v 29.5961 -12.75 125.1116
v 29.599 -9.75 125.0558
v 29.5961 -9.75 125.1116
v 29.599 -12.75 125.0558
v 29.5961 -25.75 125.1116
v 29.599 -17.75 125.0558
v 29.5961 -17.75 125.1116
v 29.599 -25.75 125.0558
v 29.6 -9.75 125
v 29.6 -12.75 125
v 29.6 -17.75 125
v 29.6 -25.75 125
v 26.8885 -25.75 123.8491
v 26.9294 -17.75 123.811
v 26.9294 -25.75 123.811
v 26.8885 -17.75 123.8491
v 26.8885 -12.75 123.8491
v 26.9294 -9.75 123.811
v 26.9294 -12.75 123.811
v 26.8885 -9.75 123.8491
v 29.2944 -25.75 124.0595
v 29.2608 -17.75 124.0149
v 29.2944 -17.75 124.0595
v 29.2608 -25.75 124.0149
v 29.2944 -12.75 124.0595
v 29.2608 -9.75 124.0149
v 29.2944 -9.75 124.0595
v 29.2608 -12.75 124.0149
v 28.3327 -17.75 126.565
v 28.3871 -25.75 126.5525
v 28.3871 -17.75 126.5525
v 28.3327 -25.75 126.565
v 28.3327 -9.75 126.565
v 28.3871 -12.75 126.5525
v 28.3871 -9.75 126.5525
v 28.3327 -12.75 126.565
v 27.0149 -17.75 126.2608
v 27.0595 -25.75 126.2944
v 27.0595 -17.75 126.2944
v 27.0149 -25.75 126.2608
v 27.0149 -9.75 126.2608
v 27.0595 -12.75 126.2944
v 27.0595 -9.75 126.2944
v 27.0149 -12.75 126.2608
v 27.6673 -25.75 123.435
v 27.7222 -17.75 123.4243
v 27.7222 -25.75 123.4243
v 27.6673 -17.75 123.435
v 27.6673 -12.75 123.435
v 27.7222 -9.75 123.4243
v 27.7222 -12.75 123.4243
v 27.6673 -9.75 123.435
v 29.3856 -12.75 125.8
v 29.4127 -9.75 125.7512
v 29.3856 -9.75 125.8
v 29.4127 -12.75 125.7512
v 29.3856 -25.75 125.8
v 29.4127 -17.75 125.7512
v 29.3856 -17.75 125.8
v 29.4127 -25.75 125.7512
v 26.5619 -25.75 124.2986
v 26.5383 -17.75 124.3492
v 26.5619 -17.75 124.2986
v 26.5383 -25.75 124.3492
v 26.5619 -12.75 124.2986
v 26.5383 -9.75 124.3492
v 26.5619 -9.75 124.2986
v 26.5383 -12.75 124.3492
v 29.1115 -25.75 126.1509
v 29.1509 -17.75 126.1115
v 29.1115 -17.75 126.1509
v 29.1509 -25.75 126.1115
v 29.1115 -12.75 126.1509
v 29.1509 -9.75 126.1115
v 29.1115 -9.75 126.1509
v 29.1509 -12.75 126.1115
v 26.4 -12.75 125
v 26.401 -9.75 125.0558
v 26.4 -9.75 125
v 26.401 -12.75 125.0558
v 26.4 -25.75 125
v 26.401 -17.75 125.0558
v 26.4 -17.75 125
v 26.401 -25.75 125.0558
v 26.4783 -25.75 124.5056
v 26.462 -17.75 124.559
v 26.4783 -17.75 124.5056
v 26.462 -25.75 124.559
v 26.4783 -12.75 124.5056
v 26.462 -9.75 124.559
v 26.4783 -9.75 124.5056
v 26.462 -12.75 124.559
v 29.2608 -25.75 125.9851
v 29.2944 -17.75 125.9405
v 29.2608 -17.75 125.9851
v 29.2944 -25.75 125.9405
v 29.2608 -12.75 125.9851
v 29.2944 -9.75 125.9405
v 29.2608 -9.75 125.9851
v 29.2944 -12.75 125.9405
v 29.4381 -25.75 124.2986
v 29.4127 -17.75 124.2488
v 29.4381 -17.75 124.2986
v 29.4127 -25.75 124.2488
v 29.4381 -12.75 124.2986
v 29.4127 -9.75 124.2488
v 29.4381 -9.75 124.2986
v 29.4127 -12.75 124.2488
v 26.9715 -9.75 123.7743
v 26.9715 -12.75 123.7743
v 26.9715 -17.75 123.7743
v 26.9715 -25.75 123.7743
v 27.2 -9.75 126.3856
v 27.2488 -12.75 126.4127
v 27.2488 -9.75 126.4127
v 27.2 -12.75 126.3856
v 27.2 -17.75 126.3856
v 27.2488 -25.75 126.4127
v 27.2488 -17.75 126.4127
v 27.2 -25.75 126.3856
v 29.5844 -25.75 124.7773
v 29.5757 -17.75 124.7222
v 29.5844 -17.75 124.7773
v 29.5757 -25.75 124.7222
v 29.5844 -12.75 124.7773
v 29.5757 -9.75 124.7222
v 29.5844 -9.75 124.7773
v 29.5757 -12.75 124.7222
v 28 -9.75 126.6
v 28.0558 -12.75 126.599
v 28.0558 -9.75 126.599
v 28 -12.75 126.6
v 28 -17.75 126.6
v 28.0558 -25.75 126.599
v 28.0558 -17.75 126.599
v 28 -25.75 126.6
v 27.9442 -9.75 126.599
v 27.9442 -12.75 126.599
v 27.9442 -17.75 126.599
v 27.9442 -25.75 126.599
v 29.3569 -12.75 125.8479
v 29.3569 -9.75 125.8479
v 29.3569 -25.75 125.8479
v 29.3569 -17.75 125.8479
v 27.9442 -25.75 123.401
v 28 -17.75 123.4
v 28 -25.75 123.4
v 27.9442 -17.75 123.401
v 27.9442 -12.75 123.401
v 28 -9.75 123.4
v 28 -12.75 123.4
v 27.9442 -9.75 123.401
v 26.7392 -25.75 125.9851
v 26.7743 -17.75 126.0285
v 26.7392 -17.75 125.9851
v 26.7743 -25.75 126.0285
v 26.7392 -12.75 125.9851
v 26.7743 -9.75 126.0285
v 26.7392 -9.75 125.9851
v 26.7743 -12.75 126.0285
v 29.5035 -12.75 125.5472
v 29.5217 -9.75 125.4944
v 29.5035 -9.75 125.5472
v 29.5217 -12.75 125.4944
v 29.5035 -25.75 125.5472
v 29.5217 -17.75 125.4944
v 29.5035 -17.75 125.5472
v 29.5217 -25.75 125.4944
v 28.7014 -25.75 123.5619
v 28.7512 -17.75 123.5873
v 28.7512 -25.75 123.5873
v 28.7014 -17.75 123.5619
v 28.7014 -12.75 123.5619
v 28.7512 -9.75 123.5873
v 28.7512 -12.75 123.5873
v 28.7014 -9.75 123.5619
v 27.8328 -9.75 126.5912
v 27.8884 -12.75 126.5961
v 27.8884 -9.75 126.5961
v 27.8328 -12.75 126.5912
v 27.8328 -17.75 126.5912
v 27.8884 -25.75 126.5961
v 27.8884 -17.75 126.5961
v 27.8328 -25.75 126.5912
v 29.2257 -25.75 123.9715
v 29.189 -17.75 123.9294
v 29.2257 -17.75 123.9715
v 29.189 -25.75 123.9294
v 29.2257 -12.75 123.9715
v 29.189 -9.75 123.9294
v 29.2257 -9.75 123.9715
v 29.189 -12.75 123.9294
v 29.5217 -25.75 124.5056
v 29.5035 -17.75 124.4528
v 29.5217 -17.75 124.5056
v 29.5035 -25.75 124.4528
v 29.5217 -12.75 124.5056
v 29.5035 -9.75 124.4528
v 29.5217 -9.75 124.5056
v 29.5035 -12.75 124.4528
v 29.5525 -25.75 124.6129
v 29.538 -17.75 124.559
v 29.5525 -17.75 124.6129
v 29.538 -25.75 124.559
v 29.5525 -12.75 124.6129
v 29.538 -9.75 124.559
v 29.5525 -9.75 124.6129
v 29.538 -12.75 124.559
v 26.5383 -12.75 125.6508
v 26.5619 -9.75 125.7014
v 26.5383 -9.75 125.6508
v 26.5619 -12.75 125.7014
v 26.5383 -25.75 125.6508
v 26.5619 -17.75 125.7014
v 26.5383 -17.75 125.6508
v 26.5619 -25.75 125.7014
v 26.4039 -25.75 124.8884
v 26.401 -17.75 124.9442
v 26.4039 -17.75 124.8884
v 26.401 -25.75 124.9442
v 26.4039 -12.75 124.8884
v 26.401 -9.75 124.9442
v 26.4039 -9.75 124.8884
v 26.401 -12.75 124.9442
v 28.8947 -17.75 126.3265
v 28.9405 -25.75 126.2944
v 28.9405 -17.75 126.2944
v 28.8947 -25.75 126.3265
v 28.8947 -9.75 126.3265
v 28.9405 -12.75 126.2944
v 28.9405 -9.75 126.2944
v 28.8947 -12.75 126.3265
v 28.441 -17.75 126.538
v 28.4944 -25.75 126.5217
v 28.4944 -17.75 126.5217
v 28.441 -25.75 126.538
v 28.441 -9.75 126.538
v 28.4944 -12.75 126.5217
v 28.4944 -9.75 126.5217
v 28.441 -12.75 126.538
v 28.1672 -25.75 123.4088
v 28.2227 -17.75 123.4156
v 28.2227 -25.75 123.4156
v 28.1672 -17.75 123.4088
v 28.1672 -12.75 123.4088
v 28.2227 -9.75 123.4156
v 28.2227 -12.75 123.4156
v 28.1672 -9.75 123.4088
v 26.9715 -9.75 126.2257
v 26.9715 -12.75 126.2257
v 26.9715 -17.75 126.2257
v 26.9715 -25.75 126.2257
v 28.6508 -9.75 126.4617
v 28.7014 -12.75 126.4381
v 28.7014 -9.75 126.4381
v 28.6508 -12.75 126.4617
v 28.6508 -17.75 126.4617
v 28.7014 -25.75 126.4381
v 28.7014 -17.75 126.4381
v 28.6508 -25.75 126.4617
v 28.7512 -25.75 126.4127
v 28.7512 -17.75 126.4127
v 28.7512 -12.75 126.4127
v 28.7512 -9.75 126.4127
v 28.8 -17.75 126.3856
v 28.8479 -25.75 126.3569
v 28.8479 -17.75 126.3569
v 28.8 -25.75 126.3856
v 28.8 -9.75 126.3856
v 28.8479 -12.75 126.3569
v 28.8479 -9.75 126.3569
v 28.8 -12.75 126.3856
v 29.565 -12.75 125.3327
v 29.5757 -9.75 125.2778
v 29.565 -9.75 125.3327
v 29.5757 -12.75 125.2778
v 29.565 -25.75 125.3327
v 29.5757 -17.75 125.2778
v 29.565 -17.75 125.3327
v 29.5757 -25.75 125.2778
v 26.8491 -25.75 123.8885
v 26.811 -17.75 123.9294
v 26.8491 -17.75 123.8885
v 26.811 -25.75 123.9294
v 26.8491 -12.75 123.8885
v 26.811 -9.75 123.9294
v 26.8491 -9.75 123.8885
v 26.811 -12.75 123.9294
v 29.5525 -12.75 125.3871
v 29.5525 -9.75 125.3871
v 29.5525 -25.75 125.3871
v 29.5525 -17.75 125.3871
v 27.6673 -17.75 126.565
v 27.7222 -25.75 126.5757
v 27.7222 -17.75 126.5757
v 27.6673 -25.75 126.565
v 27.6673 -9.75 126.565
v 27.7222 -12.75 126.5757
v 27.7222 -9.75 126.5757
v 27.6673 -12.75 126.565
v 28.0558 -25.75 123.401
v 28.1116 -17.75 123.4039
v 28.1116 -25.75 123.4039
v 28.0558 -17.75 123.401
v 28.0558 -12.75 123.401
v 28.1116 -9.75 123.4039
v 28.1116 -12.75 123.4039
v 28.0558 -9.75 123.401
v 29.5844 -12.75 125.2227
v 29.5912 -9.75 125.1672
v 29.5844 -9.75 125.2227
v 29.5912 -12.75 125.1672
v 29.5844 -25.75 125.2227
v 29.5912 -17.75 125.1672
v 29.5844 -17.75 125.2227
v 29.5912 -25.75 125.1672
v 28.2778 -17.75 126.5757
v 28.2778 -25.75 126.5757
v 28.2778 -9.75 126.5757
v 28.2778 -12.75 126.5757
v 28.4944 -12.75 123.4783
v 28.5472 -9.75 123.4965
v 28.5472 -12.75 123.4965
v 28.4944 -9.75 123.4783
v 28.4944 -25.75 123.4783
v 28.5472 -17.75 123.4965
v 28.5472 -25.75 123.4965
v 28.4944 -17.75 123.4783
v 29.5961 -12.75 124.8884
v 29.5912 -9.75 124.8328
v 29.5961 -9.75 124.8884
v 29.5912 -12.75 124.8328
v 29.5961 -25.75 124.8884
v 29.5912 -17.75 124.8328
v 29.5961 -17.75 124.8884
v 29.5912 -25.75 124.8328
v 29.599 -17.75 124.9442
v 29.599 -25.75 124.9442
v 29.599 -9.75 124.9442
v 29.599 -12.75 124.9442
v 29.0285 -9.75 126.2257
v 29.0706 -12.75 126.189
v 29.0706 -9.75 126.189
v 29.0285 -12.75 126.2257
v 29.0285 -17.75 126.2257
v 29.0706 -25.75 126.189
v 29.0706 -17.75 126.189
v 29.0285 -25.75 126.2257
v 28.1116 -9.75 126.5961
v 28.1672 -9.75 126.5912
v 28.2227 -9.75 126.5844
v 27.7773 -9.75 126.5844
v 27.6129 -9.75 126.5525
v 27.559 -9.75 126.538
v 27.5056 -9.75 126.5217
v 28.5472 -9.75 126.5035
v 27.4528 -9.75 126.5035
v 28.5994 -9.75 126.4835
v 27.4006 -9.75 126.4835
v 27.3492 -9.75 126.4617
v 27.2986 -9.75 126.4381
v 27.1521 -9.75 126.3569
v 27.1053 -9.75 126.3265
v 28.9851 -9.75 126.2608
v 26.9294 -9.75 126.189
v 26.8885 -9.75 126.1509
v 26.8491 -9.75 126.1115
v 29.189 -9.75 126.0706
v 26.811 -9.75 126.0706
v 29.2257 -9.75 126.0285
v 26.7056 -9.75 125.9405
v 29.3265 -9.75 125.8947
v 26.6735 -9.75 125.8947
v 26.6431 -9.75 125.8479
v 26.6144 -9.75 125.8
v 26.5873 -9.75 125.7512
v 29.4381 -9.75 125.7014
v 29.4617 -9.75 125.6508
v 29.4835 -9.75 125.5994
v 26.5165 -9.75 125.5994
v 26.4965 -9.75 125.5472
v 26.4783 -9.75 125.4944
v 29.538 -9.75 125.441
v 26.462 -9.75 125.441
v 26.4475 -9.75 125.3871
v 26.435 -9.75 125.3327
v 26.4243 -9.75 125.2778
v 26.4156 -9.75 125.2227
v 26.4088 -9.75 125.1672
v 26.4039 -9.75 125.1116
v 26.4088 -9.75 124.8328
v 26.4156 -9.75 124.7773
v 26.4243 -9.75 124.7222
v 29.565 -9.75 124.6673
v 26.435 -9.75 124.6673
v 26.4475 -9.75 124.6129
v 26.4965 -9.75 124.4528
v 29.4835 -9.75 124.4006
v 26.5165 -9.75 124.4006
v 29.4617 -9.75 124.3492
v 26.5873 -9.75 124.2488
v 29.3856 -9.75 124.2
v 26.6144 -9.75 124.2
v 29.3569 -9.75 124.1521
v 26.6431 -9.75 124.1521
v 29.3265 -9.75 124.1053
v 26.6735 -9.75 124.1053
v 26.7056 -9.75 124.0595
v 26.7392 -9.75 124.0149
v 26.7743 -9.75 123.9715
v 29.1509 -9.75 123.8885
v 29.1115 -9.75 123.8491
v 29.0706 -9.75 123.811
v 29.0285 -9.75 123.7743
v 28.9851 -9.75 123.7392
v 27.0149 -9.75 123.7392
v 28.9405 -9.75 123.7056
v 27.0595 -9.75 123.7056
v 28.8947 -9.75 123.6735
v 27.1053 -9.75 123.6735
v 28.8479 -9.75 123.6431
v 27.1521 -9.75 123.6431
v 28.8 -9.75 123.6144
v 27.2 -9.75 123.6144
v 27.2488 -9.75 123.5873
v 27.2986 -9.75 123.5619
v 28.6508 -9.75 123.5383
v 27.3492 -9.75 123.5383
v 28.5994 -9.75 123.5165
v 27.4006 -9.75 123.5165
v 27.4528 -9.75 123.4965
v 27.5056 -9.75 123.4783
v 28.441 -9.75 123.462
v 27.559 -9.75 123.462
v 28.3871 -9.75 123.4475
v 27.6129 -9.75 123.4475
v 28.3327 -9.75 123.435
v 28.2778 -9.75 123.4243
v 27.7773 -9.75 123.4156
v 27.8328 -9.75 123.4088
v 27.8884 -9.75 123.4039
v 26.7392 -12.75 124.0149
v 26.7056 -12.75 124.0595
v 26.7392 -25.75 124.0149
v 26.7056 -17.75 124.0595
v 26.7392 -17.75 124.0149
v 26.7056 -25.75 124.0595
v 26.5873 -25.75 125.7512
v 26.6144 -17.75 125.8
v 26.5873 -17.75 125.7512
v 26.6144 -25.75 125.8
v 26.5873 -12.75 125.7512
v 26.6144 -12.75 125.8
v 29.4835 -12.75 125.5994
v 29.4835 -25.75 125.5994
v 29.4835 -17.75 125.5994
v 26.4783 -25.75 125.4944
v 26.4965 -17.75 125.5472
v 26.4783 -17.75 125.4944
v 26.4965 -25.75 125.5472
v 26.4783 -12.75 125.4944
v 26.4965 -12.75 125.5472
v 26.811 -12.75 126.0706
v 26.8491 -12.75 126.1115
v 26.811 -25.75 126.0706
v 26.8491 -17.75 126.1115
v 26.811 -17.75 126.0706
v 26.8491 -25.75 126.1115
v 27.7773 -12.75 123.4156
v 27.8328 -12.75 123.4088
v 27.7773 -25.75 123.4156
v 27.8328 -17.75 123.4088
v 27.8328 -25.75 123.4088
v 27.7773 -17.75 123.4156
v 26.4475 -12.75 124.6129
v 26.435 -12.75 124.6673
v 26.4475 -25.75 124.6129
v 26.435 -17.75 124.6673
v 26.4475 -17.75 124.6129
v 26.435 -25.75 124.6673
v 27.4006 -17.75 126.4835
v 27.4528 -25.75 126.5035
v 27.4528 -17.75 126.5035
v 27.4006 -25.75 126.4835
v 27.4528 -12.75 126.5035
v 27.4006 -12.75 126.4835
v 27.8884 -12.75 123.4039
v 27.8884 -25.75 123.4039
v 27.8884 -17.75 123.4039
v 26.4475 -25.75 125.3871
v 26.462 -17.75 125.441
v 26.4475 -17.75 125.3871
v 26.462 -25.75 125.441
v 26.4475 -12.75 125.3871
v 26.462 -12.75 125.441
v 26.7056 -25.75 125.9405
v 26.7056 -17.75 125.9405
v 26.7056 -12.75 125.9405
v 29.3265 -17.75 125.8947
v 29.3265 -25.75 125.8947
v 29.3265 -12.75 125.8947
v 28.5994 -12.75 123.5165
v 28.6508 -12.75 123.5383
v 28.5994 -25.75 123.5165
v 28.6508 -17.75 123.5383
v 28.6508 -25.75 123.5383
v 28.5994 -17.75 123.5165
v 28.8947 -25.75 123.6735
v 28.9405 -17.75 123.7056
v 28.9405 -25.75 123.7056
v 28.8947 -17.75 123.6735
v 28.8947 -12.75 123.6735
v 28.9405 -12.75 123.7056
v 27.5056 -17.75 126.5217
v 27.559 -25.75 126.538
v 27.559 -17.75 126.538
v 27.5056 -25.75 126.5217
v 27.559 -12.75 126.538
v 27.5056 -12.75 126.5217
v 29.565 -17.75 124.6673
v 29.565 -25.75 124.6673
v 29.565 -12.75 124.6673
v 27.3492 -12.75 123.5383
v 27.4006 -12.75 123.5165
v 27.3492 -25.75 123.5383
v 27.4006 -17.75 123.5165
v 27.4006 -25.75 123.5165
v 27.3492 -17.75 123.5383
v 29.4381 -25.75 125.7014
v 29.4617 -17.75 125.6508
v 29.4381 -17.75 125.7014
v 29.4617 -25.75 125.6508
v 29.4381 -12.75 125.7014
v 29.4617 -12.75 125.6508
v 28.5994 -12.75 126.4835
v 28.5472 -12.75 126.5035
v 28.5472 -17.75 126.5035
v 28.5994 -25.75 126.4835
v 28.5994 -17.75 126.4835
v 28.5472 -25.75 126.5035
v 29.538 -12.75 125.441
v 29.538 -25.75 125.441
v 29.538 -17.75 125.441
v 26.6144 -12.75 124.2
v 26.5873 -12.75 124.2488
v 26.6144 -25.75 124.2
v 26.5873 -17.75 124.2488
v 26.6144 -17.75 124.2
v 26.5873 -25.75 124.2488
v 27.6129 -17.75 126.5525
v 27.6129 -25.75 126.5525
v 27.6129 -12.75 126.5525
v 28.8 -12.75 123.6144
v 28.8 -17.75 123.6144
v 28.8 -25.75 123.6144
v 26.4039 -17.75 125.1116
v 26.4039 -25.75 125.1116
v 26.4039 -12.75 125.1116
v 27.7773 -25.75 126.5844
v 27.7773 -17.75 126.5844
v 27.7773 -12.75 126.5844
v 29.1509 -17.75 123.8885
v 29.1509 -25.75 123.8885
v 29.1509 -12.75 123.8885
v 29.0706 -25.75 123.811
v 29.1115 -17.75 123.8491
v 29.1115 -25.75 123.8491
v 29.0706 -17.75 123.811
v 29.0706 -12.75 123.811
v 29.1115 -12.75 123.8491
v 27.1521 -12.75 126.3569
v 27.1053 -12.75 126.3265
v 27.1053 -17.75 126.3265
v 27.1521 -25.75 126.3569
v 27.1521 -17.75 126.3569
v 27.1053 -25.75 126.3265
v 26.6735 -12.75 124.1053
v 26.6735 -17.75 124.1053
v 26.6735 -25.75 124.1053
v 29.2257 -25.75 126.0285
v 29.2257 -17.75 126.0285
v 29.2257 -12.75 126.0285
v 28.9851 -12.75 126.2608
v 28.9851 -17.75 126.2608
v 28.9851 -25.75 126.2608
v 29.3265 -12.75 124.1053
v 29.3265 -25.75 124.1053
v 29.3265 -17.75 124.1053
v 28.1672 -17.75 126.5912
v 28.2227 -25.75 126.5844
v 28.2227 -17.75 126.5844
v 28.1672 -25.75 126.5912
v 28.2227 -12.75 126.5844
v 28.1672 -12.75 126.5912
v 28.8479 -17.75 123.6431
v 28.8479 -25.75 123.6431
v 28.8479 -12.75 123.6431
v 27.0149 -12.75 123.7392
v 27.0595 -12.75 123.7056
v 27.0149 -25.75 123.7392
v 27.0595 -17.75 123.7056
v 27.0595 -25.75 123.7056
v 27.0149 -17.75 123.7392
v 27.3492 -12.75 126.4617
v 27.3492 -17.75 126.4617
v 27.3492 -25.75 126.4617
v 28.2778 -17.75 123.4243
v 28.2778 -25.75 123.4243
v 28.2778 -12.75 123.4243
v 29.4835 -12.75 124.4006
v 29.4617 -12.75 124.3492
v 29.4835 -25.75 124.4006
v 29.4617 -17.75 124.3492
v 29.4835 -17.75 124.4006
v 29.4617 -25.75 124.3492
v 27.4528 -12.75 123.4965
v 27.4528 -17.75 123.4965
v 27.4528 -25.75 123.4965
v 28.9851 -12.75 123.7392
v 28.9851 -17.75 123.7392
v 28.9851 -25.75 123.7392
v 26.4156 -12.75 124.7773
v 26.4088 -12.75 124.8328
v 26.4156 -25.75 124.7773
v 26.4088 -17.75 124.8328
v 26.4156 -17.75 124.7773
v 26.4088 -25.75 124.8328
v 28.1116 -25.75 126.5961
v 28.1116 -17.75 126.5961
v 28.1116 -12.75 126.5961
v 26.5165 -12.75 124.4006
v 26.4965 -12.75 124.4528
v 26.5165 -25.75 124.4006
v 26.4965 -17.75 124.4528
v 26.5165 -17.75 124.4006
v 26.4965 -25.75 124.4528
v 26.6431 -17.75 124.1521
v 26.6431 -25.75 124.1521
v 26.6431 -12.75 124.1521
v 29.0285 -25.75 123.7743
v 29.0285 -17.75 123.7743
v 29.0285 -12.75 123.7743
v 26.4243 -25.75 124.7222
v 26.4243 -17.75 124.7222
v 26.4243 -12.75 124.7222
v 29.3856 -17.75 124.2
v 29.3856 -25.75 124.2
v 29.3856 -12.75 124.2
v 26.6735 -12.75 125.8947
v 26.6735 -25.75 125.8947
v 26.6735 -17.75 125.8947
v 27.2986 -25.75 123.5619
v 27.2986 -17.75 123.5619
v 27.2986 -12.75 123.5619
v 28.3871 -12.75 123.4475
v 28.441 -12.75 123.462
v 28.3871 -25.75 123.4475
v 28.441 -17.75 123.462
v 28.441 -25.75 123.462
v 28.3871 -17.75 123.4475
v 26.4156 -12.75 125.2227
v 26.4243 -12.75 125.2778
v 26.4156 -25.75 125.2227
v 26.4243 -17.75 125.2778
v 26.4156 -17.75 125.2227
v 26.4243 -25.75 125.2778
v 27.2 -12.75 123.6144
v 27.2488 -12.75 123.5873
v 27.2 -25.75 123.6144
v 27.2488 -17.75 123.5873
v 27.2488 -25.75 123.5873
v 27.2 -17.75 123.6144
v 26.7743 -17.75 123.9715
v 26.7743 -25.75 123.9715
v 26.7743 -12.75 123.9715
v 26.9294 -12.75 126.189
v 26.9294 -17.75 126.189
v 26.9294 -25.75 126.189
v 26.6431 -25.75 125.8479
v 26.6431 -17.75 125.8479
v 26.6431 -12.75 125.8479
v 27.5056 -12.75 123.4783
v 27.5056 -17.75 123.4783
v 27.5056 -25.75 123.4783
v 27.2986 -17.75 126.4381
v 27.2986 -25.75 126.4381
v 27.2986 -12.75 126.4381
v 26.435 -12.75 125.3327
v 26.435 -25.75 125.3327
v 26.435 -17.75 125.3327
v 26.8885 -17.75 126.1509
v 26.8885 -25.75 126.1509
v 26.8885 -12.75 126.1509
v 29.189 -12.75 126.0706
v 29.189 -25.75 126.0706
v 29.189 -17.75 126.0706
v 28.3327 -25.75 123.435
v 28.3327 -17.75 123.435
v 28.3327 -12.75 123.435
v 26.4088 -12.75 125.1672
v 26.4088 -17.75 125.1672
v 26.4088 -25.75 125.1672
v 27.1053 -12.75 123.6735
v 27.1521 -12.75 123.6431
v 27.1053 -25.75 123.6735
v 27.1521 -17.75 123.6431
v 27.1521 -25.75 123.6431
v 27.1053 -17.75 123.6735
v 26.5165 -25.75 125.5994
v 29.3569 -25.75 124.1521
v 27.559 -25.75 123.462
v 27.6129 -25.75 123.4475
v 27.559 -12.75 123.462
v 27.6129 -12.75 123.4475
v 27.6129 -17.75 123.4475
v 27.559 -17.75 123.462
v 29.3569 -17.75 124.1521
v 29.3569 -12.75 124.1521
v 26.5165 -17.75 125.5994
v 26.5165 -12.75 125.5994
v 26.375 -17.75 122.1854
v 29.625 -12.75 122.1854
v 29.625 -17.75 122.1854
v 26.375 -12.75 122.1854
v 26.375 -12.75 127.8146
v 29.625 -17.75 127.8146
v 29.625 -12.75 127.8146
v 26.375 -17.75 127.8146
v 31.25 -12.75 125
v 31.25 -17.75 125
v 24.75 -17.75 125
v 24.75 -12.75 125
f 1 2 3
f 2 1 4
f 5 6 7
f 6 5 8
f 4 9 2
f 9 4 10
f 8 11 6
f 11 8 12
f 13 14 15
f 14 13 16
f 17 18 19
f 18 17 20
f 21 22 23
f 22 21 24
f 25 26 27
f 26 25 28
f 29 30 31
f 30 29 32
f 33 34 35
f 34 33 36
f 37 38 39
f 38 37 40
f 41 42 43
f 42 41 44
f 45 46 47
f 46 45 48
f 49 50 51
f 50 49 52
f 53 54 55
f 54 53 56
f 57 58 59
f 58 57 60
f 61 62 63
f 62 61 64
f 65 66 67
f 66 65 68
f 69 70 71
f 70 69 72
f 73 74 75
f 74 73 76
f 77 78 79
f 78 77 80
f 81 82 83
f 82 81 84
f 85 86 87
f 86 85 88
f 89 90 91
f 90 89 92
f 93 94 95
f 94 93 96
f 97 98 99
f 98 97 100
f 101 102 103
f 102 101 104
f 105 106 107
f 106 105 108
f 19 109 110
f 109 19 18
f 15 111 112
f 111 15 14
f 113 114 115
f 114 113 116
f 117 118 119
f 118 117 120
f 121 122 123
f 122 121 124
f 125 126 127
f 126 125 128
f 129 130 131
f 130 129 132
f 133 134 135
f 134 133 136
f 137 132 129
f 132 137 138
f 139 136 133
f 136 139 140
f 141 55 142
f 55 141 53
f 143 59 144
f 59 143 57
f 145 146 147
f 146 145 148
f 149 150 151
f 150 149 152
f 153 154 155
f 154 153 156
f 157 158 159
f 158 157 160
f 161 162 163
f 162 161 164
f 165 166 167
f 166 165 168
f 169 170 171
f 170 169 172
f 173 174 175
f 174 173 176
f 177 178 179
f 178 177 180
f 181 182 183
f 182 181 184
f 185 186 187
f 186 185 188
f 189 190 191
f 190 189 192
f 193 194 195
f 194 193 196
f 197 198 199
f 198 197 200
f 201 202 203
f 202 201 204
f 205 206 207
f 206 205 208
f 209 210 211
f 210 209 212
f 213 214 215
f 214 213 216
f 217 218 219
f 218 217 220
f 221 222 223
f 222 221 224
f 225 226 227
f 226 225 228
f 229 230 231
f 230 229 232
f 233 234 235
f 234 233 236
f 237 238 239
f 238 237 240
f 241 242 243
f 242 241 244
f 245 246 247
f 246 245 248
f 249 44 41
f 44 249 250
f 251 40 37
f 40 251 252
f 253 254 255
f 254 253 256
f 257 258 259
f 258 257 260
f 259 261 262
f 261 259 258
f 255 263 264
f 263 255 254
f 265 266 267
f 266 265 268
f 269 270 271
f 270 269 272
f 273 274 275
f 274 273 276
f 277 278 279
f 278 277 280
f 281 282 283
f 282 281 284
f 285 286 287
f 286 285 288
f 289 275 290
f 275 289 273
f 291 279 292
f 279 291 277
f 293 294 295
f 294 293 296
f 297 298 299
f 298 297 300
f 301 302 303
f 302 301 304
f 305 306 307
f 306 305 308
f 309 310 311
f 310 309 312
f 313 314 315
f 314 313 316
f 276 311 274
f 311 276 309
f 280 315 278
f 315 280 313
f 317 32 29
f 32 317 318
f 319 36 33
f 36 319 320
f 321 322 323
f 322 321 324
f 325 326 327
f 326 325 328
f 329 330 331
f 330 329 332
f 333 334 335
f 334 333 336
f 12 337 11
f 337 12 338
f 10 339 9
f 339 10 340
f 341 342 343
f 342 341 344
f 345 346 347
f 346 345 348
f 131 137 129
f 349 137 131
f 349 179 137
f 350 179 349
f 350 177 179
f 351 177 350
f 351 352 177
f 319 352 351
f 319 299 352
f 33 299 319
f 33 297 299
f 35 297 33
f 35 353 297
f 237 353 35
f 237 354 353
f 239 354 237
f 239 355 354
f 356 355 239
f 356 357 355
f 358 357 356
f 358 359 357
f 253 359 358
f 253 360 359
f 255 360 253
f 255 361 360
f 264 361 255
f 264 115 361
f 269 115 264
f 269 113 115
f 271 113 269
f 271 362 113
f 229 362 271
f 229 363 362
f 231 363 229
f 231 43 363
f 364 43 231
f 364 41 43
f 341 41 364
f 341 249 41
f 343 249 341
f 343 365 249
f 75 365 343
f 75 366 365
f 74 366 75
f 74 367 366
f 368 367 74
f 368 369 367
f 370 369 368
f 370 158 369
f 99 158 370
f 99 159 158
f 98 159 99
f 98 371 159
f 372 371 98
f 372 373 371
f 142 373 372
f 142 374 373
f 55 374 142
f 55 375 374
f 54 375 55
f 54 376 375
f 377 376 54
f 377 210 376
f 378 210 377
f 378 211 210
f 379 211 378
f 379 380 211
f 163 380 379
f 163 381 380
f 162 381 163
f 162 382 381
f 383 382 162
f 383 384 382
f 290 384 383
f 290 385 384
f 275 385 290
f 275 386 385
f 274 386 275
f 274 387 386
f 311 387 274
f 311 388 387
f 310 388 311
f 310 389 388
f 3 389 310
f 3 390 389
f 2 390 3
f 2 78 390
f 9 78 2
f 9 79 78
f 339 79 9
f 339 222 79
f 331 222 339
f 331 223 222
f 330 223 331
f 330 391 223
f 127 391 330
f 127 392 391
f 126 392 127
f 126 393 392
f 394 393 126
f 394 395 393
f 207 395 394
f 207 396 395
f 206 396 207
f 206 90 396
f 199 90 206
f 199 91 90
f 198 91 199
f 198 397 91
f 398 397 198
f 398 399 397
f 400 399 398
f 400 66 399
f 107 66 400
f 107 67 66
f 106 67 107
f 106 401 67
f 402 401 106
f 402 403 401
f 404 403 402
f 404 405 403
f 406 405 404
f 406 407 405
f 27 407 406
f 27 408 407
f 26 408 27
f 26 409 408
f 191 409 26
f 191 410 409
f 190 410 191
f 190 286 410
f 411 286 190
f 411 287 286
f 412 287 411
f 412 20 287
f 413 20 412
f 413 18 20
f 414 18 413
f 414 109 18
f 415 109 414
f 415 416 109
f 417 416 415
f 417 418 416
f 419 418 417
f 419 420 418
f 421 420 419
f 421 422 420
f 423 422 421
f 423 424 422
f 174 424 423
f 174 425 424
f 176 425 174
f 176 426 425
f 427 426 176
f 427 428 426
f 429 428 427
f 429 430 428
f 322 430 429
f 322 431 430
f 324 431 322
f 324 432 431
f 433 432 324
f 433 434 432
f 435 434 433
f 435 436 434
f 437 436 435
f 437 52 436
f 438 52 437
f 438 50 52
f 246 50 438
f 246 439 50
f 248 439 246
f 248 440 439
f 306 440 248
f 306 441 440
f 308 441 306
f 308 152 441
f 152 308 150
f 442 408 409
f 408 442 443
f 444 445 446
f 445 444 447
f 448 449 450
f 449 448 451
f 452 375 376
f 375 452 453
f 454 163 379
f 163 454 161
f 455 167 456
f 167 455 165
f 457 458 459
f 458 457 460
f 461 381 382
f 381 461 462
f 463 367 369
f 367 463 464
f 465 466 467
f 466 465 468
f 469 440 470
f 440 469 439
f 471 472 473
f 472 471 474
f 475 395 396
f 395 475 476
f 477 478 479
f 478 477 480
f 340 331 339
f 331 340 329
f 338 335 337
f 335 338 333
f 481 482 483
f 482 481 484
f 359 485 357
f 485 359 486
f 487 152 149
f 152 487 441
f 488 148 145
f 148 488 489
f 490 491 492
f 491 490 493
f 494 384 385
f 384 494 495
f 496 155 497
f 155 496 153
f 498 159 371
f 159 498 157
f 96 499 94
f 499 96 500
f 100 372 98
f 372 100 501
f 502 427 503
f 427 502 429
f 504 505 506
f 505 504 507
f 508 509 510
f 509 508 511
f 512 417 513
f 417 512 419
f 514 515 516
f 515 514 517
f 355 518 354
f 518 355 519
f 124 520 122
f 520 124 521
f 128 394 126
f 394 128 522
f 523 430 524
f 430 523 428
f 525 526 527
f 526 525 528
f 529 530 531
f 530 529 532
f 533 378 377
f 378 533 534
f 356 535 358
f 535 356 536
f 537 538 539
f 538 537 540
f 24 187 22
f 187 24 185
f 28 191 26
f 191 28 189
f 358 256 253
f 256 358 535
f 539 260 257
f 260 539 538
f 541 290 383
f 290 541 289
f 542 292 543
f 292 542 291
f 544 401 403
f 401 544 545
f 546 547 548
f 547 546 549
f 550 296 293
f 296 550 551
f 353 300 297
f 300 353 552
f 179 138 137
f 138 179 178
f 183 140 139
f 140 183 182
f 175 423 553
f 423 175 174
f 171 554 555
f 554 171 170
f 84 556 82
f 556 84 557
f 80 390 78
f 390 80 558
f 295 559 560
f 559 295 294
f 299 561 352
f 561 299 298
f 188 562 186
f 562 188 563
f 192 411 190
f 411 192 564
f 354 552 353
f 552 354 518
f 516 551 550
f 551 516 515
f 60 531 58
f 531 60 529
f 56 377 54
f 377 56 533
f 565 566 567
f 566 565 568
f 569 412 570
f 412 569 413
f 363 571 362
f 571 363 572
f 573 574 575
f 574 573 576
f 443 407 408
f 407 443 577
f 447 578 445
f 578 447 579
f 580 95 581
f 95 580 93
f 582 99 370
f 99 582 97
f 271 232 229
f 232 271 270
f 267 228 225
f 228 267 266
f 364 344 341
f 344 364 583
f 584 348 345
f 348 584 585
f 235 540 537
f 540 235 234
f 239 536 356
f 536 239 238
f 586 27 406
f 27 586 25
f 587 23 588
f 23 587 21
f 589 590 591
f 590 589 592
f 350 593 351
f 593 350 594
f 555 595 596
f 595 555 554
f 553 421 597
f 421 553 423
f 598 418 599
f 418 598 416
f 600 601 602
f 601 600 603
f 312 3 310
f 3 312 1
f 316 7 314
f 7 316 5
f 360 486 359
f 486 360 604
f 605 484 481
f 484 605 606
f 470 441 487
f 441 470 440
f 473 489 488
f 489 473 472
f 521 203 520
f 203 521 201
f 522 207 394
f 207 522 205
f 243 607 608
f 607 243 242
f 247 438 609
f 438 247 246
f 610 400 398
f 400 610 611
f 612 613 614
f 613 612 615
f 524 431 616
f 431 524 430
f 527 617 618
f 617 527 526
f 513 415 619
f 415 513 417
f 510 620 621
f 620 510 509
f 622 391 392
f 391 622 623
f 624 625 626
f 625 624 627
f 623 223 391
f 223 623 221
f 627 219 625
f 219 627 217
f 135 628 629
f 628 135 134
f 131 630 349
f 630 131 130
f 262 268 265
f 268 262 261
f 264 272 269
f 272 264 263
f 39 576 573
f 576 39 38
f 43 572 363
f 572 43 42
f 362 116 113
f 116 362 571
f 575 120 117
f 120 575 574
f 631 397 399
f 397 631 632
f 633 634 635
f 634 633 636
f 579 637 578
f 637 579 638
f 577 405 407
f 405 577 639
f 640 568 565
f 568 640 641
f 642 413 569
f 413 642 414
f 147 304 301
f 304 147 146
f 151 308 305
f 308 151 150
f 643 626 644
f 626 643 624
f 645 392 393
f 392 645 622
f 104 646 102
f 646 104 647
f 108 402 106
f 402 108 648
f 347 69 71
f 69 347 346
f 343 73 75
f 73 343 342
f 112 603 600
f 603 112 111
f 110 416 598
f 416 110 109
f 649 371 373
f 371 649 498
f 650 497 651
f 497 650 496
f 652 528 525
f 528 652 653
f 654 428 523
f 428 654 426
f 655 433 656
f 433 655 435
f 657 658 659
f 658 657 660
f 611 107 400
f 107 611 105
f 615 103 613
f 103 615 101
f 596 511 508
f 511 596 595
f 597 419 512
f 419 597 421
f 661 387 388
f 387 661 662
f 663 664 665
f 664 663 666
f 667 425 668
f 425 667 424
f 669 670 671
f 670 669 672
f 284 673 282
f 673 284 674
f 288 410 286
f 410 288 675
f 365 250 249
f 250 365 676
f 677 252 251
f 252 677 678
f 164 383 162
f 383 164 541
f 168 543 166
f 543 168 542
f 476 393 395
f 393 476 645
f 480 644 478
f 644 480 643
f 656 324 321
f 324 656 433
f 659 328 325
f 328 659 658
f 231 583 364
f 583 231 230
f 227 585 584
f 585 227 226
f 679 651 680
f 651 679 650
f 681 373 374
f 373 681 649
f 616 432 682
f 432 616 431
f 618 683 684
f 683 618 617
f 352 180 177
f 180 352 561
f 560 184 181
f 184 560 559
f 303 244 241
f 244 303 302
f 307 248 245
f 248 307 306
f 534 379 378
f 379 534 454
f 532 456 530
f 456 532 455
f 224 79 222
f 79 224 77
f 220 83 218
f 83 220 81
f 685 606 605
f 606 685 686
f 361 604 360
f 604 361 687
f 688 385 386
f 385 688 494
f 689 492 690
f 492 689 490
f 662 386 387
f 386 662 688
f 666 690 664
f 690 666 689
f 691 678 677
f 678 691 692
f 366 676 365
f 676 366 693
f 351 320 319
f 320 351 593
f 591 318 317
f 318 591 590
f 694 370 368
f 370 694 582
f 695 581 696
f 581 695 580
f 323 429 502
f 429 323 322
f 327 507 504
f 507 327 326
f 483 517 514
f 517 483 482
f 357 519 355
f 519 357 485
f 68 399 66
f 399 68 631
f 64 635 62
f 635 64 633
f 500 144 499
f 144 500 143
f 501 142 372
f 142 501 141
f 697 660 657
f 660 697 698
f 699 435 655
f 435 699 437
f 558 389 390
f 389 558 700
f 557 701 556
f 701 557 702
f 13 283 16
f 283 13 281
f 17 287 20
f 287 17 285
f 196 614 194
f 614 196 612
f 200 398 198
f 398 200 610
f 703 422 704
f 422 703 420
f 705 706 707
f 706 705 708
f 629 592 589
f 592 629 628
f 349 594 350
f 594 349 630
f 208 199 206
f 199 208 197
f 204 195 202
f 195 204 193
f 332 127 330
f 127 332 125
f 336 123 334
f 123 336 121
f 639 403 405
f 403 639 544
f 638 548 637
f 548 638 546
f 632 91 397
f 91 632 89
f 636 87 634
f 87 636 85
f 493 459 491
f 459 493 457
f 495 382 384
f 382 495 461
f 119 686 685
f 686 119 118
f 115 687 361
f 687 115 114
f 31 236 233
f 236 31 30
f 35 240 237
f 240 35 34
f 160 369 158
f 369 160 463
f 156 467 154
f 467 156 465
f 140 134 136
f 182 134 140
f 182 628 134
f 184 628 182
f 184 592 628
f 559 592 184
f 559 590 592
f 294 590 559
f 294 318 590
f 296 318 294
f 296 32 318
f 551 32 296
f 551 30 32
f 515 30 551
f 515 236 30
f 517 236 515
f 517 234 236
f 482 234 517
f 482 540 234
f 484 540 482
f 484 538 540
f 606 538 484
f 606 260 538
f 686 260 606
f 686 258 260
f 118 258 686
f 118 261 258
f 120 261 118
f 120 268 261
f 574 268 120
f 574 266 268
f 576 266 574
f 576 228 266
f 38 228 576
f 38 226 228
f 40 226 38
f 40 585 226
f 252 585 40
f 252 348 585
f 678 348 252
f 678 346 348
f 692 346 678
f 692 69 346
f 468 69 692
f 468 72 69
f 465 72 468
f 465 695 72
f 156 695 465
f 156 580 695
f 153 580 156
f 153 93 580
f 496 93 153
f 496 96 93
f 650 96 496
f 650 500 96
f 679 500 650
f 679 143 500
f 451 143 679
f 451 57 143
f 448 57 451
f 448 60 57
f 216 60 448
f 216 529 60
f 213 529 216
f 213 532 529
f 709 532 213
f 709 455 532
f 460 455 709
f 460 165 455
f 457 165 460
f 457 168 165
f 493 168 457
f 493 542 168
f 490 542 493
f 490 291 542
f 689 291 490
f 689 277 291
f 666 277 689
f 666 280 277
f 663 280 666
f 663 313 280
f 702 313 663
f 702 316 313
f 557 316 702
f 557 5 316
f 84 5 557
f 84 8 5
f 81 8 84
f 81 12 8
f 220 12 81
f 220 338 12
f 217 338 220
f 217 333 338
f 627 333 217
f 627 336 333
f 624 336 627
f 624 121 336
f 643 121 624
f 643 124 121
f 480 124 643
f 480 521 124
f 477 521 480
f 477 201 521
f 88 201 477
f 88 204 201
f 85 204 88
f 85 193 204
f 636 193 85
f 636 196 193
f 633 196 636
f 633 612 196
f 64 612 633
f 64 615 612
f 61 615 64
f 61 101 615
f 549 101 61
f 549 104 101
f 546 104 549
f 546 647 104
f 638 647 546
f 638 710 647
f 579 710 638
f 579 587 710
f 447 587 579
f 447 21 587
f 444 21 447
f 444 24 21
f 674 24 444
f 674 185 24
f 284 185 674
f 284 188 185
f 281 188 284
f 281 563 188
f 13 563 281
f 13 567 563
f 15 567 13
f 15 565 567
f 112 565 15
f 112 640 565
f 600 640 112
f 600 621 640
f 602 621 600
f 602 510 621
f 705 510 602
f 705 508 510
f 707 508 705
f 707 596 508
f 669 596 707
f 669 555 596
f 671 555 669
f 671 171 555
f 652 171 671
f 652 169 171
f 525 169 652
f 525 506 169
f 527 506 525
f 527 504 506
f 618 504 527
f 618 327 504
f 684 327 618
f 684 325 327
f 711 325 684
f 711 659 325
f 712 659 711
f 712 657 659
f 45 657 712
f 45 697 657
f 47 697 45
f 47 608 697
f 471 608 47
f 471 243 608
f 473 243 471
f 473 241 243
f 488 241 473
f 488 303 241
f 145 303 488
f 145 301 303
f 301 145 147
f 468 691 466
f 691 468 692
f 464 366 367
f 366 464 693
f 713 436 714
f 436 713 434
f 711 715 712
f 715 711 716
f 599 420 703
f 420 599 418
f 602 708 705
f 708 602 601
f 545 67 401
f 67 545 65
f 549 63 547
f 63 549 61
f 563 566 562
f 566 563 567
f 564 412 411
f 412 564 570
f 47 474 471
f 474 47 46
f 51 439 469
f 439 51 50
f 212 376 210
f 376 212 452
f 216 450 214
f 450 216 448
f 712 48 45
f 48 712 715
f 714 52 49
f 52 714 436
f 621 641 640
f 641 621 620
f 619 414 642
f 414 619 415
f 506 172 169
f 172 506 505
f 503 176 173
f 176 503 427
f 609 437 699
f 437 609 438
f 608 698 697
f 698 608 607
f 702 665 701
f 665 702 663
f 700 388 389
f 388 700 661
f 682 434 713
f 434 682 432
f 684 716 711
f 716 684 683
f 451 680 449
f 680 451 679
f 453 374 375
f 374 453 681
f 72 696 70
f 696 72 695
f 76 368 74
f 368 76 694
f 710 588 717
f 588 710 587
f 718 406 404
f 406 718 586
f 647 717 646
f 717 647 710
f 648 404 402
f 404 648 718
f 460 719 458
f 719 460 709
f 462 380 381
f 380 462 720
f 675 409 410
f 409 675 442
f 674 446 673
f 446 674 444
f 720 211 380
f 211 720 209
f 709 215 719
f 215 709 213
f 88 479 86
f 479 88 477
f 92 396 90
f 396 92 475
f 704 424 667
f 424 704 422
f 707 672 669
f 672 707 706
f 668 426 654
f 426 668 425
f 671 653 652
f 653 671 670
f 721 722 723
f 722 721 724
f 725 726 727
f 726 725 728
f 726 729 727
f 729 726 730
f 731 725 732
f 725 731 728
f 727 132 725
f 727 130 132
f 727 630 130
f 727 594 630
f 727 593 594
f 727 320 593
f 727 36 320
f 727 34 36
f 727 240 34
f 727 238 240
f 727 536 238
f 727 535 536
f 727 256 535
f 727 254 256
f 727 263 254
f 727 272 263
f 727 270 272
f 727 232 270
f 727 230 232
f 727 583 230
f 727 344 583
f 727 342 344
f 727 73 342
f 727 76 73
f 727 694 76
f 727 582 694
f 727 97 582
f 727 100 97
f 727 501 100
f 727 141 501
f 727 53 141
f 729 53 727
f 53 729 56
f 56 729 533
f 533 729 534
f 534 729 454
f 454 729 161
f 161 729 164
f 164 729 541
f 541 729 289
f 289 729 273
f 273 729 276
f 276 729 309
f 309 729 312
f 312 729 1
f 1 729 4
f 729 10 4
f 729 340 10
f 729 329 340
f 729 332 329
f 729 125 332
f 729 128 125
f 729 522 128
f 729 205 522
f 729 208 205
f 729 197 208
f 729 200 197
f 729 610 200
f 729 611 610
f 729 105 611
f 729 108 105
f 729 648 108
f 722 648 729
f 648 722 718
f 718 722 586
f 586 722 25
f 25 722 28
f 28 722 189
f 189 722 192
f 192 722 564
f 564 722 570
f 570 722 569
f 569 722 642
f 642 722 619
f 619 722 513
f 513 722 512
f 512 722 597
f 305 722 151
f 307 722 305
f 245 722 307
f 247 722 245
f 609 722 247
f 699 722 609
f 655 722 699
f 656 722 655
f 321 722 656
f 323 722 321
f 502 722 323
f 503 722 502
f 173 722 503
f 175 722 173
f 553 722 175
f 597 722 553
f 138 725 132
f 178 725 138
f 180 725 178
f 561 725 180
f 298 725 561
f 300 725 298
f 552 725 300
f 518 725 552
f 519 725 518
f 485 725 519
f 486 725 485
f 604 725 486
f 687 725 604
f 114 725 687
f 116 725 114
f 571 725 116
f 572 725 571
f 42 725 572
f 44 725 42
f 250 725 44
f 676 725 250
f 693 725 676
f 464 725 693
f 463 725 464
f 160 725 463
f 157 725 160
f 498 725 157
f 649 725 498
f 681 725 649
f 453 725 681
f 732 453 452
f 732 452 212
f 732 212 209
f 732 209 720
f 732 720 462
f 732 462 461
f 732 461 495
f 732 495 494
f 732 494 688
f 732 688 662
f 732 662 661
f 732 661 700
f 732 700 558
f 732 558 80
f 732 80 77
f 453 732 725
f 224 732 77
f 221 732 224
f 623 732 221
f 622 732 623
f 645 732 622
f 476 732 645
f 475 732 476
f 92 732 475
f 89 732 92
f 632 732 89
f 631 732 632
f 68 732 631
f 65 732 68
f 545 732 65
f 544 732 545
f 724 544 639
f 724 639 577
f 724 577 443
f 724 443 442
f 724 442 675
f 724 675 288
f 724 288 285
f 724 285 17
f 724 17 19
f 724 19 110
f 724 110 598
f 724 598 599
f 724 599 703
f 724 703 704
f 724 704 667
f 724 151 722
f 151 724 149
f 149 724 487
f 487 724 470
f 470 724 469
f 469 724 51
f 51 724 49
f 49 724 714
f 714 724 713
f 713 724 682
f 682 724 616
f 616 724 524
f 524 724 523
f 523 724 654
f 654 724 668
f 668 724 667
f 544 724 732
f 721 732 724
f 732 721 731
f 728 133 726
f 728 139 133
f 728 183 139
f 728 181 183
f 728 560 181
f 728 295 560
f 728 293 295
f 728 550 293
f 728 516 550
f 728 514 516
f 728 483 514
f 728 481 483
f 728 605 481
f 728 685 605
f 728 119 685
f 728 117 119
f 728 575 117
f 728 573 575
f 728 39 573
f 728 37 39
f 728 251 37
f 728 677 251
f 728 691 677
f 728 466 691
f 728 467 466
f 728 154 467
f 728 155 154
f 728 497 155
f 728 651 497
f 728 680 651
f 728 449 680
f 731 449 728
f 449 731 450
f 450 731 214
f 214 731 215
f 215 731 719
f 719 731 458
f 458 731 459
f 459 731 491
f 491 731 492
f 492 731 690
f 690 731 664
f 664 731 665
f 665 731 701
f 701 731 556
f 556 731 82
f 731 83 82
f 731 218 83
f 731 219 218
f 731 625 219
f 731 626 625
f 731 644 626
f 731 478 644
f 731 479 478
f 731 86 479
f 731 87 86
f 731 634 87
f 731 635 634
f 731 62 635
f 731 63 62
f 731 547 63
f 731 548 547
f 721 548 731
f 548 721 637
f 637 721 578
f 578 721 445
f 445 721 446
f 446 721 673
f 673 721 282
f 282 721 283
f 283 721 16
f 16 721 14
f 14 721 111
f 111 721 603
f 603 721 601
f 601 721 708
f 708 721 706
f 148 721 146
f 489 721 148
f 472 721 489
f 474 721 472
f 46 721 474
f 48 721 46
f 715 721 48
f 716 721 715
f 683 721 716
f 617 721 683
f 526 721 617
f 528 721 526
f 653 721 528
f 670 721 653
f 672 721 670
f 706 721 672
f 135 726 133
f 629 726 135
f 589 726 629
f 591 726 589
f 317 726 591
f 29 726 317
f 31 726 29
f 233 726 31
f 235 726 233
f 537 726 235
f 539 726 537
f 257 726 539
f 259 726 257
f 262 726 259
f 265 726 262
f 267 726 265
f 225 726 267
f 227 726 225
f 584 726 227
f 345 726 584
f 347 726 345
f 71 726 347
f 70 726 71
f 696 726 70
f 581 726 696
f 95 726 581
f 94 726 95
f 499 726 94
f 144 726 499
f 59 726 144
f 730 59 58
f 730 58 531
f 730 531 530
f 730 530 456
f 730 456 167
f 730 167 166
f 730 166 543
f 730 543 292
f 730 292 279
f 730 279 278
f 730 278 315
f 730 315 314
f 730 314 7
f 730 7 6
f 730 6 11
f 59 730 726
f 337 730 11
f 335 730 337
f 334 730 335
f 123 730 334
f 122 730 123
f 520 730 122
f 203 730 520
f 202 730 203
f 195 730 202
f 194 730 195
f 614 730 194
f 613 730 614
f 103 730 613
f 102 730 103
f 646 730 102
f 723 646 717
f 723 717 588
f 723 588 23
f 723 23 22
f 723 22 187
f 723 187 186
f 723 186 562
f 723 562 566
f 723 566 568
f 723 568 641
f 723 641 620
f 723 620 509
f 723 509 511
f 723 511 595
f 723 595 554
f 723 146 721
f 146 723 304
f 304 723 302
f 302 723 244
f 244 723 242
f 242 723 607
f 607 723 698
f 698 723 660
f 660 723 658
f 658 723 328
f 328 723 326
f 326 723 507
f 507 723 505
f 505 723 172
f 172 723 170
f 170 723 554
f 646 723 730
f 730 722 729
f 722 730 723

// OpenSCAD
translate([28,-28+10.25,107.5+15+2.5]) rotate([90,0,0]) cylinder(h = 16, d=3.2, $fn = 180, center = true);

//hexagon
translate([28,-2.5-28+10.25+5,107.5+15+2.5]) rotate([90,0,0]) cylinder(h = 5, d=6.5, $fn = 6, center = true);
